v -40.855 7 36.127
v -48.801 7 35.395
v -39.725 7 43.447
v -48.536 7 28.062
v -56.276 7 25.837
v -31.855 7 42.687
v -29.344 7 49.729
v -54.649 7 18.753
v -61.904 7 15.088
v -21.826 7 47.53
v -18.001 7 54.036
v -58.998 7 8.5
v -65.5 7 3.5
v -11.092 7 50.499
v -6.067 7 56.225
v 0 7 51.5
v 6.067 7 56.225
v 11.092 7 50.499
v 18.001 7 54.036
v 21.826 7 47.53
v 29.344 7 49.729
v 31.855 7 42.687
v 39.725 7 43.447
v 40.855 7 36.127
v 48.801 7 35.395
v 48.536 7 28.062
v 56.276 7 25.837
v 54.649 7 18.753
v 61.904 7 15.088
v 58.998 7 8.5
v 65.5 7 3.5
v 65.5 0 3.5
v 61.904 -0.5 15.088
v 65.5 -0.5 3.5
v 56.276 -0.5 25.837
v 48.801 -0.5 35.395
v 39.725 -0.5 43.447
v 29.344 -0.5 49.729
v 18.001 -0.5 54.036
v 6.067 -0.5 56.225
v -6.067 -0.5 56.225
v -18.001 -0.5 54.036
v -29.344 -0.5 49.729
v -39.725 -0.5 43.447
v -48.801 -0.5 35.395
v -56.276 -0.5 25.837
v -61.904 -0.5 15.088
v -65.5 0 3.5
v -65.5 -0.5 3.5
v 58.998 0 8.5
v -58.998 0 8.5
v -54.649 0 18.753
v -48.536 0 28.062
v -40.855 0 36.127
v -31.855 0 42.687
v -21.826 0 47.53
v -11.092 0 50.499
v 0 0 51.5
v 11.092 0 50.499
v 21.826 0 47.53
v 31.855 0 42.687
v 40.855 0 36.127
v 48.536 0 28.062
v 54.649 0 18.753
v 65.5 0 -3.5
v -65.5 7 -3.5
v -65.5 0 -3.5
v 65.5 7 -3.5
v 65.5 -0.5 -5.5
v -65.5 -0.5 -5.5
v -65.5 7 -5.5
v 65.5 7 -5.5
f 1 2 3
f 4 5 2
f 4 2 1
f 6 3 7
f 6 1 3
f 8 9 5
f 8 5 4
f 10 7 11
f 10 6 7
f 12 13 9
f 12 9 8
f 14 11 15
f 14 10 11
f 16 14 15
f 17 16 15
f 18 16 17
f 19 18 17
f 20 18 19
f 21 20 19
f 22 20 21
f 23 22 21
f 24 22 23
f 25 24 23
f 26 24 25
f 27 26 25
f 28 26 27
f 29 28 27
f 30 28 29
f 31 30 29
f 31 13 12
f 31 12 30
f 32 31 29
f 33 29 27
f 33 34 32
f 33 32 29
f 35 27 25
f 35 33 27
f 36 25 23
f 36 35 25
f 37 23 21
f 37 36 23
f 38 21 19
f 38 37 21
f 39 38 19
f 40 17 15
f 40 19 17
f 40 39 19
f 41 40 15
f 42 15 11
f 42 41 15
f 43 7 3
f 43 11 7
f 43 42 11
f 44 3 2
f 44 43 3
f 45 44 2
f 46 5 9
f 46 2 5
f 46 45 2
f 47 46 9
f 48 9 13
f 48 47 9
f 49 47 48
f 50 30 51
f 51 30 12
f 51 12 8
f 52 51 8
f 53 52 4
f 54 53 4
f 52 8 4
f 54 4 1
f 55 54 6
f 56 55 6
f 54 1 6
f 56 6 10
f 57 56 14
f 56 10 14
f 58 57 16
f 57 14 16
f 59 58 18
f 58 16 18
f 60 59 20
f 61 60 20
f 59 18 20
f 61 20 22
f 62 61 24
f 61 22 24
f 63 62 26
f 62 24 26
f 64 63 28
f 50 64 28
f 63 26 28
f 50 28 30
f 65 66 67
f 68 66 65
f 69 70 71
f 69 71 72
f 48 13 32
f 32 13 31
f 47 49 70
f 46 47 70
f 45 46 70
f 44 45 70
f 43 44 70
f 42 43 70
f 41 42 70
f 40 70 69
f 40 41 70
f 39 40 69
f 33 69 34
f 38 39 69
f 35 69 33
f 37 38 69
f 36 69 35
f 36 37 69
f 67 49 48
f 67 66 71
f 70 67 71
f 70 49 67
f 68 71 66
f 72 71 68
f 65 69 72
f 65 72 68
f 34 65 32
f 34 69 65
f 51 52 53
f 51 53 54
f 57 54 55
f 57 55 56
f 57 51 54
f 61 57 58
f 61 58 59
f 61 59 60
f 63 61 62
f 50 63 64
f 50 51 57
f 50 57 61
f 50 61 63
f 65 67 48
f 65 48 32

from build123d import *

# Parameters (mm, degrees)
SKETCH1_W           = 129
SKETCH1_H           = 7
BOSS_EXTRUDE1_DEPTH = 7
BOSS_EXTRUDE2_START = 0.5
BOSS_EXTRUDE2_DEPTH = 0.5
SKETCH3_W           = 131
SKETCH3_H           = 7
CUT_EXTRUDE4_DEPTH  = 7
CUT_EXTRUDE5_DEPTH  = 7


with BuildPart() as part:
    # Sketch1 → Boss-Extrude1 (new body)
    with BuildSketch(Plane(origin=(0, 0, 0), x_dir=(1, 0, 0), z_dir=(0, 1, 0))):
        with BuildLine():
            Line((-65.5, 5.5), (-65.5, -3.5))
            ThreePointArc((-65.5, -3.5), (0, -56.5), (65.5, -3.5))
            Line((65.5, -3.5), (65.5, 5.5))
            Line((65.5, 5.5), (-65.5, 5.5))
        make_face()
        Rectangle(SKETCH1_W, SKETCH1_H, mode=Mode.SUBTRACT)
    extrude(amount=BOSS_EXTRUDE1_DEPTH)

    # Sketch2 → Boss-Extrude2 (add)
    with BuildSketch(Plane.XZ.offset(BOSS_EXTRUDE2_START)):
        with BuildLine():
            Line((-65.5, -5.5), (65.5, -5.5))
            Line((65.5, -5.5), (65.5, 3.5))
            ThreePointArc((65.5, 3.5), (0, 56.5), (-65.5, 3.5))
            Line((-65.5, 3.5), (-65.5, -5.5))
        make_face()
    extrude(amount=-BOSS_EXTRUDE2_DEPTH)

    # Sketch3 → Cut-Extrude4 (cut)
    with BuildSketch(Plane(origin=(0, 7, 0), x_dir=(1, 0, 0), z_dir=(0, 1, 0))):
        Rectangle(SKETCH3_W, SKETCH3_H)
    extrude(amount=-CUT_EXTRUDE4_DEPTH, mode=Mode.SUBTRACT)

    # Sketch4 → Cut-Extrude5 (cut)
    with BuildSketch(Plane(origin=(0, 7, 0), x_dir=(1, 0, 0), z_dir=(0, 1, 0))):
        with BuildLine():
            Line((58.998041221, -8.5), (-58.998041221, -8.5))
            ThreePointArc((-58.998041221, -8.5), (0, -51.5), (58.998041221, -8.5))
        make_face()
    extrude(amount=-CUT_EXTRUDE5_DEPTH, mode=Mode.SUBTRACT)


solid = part.part
